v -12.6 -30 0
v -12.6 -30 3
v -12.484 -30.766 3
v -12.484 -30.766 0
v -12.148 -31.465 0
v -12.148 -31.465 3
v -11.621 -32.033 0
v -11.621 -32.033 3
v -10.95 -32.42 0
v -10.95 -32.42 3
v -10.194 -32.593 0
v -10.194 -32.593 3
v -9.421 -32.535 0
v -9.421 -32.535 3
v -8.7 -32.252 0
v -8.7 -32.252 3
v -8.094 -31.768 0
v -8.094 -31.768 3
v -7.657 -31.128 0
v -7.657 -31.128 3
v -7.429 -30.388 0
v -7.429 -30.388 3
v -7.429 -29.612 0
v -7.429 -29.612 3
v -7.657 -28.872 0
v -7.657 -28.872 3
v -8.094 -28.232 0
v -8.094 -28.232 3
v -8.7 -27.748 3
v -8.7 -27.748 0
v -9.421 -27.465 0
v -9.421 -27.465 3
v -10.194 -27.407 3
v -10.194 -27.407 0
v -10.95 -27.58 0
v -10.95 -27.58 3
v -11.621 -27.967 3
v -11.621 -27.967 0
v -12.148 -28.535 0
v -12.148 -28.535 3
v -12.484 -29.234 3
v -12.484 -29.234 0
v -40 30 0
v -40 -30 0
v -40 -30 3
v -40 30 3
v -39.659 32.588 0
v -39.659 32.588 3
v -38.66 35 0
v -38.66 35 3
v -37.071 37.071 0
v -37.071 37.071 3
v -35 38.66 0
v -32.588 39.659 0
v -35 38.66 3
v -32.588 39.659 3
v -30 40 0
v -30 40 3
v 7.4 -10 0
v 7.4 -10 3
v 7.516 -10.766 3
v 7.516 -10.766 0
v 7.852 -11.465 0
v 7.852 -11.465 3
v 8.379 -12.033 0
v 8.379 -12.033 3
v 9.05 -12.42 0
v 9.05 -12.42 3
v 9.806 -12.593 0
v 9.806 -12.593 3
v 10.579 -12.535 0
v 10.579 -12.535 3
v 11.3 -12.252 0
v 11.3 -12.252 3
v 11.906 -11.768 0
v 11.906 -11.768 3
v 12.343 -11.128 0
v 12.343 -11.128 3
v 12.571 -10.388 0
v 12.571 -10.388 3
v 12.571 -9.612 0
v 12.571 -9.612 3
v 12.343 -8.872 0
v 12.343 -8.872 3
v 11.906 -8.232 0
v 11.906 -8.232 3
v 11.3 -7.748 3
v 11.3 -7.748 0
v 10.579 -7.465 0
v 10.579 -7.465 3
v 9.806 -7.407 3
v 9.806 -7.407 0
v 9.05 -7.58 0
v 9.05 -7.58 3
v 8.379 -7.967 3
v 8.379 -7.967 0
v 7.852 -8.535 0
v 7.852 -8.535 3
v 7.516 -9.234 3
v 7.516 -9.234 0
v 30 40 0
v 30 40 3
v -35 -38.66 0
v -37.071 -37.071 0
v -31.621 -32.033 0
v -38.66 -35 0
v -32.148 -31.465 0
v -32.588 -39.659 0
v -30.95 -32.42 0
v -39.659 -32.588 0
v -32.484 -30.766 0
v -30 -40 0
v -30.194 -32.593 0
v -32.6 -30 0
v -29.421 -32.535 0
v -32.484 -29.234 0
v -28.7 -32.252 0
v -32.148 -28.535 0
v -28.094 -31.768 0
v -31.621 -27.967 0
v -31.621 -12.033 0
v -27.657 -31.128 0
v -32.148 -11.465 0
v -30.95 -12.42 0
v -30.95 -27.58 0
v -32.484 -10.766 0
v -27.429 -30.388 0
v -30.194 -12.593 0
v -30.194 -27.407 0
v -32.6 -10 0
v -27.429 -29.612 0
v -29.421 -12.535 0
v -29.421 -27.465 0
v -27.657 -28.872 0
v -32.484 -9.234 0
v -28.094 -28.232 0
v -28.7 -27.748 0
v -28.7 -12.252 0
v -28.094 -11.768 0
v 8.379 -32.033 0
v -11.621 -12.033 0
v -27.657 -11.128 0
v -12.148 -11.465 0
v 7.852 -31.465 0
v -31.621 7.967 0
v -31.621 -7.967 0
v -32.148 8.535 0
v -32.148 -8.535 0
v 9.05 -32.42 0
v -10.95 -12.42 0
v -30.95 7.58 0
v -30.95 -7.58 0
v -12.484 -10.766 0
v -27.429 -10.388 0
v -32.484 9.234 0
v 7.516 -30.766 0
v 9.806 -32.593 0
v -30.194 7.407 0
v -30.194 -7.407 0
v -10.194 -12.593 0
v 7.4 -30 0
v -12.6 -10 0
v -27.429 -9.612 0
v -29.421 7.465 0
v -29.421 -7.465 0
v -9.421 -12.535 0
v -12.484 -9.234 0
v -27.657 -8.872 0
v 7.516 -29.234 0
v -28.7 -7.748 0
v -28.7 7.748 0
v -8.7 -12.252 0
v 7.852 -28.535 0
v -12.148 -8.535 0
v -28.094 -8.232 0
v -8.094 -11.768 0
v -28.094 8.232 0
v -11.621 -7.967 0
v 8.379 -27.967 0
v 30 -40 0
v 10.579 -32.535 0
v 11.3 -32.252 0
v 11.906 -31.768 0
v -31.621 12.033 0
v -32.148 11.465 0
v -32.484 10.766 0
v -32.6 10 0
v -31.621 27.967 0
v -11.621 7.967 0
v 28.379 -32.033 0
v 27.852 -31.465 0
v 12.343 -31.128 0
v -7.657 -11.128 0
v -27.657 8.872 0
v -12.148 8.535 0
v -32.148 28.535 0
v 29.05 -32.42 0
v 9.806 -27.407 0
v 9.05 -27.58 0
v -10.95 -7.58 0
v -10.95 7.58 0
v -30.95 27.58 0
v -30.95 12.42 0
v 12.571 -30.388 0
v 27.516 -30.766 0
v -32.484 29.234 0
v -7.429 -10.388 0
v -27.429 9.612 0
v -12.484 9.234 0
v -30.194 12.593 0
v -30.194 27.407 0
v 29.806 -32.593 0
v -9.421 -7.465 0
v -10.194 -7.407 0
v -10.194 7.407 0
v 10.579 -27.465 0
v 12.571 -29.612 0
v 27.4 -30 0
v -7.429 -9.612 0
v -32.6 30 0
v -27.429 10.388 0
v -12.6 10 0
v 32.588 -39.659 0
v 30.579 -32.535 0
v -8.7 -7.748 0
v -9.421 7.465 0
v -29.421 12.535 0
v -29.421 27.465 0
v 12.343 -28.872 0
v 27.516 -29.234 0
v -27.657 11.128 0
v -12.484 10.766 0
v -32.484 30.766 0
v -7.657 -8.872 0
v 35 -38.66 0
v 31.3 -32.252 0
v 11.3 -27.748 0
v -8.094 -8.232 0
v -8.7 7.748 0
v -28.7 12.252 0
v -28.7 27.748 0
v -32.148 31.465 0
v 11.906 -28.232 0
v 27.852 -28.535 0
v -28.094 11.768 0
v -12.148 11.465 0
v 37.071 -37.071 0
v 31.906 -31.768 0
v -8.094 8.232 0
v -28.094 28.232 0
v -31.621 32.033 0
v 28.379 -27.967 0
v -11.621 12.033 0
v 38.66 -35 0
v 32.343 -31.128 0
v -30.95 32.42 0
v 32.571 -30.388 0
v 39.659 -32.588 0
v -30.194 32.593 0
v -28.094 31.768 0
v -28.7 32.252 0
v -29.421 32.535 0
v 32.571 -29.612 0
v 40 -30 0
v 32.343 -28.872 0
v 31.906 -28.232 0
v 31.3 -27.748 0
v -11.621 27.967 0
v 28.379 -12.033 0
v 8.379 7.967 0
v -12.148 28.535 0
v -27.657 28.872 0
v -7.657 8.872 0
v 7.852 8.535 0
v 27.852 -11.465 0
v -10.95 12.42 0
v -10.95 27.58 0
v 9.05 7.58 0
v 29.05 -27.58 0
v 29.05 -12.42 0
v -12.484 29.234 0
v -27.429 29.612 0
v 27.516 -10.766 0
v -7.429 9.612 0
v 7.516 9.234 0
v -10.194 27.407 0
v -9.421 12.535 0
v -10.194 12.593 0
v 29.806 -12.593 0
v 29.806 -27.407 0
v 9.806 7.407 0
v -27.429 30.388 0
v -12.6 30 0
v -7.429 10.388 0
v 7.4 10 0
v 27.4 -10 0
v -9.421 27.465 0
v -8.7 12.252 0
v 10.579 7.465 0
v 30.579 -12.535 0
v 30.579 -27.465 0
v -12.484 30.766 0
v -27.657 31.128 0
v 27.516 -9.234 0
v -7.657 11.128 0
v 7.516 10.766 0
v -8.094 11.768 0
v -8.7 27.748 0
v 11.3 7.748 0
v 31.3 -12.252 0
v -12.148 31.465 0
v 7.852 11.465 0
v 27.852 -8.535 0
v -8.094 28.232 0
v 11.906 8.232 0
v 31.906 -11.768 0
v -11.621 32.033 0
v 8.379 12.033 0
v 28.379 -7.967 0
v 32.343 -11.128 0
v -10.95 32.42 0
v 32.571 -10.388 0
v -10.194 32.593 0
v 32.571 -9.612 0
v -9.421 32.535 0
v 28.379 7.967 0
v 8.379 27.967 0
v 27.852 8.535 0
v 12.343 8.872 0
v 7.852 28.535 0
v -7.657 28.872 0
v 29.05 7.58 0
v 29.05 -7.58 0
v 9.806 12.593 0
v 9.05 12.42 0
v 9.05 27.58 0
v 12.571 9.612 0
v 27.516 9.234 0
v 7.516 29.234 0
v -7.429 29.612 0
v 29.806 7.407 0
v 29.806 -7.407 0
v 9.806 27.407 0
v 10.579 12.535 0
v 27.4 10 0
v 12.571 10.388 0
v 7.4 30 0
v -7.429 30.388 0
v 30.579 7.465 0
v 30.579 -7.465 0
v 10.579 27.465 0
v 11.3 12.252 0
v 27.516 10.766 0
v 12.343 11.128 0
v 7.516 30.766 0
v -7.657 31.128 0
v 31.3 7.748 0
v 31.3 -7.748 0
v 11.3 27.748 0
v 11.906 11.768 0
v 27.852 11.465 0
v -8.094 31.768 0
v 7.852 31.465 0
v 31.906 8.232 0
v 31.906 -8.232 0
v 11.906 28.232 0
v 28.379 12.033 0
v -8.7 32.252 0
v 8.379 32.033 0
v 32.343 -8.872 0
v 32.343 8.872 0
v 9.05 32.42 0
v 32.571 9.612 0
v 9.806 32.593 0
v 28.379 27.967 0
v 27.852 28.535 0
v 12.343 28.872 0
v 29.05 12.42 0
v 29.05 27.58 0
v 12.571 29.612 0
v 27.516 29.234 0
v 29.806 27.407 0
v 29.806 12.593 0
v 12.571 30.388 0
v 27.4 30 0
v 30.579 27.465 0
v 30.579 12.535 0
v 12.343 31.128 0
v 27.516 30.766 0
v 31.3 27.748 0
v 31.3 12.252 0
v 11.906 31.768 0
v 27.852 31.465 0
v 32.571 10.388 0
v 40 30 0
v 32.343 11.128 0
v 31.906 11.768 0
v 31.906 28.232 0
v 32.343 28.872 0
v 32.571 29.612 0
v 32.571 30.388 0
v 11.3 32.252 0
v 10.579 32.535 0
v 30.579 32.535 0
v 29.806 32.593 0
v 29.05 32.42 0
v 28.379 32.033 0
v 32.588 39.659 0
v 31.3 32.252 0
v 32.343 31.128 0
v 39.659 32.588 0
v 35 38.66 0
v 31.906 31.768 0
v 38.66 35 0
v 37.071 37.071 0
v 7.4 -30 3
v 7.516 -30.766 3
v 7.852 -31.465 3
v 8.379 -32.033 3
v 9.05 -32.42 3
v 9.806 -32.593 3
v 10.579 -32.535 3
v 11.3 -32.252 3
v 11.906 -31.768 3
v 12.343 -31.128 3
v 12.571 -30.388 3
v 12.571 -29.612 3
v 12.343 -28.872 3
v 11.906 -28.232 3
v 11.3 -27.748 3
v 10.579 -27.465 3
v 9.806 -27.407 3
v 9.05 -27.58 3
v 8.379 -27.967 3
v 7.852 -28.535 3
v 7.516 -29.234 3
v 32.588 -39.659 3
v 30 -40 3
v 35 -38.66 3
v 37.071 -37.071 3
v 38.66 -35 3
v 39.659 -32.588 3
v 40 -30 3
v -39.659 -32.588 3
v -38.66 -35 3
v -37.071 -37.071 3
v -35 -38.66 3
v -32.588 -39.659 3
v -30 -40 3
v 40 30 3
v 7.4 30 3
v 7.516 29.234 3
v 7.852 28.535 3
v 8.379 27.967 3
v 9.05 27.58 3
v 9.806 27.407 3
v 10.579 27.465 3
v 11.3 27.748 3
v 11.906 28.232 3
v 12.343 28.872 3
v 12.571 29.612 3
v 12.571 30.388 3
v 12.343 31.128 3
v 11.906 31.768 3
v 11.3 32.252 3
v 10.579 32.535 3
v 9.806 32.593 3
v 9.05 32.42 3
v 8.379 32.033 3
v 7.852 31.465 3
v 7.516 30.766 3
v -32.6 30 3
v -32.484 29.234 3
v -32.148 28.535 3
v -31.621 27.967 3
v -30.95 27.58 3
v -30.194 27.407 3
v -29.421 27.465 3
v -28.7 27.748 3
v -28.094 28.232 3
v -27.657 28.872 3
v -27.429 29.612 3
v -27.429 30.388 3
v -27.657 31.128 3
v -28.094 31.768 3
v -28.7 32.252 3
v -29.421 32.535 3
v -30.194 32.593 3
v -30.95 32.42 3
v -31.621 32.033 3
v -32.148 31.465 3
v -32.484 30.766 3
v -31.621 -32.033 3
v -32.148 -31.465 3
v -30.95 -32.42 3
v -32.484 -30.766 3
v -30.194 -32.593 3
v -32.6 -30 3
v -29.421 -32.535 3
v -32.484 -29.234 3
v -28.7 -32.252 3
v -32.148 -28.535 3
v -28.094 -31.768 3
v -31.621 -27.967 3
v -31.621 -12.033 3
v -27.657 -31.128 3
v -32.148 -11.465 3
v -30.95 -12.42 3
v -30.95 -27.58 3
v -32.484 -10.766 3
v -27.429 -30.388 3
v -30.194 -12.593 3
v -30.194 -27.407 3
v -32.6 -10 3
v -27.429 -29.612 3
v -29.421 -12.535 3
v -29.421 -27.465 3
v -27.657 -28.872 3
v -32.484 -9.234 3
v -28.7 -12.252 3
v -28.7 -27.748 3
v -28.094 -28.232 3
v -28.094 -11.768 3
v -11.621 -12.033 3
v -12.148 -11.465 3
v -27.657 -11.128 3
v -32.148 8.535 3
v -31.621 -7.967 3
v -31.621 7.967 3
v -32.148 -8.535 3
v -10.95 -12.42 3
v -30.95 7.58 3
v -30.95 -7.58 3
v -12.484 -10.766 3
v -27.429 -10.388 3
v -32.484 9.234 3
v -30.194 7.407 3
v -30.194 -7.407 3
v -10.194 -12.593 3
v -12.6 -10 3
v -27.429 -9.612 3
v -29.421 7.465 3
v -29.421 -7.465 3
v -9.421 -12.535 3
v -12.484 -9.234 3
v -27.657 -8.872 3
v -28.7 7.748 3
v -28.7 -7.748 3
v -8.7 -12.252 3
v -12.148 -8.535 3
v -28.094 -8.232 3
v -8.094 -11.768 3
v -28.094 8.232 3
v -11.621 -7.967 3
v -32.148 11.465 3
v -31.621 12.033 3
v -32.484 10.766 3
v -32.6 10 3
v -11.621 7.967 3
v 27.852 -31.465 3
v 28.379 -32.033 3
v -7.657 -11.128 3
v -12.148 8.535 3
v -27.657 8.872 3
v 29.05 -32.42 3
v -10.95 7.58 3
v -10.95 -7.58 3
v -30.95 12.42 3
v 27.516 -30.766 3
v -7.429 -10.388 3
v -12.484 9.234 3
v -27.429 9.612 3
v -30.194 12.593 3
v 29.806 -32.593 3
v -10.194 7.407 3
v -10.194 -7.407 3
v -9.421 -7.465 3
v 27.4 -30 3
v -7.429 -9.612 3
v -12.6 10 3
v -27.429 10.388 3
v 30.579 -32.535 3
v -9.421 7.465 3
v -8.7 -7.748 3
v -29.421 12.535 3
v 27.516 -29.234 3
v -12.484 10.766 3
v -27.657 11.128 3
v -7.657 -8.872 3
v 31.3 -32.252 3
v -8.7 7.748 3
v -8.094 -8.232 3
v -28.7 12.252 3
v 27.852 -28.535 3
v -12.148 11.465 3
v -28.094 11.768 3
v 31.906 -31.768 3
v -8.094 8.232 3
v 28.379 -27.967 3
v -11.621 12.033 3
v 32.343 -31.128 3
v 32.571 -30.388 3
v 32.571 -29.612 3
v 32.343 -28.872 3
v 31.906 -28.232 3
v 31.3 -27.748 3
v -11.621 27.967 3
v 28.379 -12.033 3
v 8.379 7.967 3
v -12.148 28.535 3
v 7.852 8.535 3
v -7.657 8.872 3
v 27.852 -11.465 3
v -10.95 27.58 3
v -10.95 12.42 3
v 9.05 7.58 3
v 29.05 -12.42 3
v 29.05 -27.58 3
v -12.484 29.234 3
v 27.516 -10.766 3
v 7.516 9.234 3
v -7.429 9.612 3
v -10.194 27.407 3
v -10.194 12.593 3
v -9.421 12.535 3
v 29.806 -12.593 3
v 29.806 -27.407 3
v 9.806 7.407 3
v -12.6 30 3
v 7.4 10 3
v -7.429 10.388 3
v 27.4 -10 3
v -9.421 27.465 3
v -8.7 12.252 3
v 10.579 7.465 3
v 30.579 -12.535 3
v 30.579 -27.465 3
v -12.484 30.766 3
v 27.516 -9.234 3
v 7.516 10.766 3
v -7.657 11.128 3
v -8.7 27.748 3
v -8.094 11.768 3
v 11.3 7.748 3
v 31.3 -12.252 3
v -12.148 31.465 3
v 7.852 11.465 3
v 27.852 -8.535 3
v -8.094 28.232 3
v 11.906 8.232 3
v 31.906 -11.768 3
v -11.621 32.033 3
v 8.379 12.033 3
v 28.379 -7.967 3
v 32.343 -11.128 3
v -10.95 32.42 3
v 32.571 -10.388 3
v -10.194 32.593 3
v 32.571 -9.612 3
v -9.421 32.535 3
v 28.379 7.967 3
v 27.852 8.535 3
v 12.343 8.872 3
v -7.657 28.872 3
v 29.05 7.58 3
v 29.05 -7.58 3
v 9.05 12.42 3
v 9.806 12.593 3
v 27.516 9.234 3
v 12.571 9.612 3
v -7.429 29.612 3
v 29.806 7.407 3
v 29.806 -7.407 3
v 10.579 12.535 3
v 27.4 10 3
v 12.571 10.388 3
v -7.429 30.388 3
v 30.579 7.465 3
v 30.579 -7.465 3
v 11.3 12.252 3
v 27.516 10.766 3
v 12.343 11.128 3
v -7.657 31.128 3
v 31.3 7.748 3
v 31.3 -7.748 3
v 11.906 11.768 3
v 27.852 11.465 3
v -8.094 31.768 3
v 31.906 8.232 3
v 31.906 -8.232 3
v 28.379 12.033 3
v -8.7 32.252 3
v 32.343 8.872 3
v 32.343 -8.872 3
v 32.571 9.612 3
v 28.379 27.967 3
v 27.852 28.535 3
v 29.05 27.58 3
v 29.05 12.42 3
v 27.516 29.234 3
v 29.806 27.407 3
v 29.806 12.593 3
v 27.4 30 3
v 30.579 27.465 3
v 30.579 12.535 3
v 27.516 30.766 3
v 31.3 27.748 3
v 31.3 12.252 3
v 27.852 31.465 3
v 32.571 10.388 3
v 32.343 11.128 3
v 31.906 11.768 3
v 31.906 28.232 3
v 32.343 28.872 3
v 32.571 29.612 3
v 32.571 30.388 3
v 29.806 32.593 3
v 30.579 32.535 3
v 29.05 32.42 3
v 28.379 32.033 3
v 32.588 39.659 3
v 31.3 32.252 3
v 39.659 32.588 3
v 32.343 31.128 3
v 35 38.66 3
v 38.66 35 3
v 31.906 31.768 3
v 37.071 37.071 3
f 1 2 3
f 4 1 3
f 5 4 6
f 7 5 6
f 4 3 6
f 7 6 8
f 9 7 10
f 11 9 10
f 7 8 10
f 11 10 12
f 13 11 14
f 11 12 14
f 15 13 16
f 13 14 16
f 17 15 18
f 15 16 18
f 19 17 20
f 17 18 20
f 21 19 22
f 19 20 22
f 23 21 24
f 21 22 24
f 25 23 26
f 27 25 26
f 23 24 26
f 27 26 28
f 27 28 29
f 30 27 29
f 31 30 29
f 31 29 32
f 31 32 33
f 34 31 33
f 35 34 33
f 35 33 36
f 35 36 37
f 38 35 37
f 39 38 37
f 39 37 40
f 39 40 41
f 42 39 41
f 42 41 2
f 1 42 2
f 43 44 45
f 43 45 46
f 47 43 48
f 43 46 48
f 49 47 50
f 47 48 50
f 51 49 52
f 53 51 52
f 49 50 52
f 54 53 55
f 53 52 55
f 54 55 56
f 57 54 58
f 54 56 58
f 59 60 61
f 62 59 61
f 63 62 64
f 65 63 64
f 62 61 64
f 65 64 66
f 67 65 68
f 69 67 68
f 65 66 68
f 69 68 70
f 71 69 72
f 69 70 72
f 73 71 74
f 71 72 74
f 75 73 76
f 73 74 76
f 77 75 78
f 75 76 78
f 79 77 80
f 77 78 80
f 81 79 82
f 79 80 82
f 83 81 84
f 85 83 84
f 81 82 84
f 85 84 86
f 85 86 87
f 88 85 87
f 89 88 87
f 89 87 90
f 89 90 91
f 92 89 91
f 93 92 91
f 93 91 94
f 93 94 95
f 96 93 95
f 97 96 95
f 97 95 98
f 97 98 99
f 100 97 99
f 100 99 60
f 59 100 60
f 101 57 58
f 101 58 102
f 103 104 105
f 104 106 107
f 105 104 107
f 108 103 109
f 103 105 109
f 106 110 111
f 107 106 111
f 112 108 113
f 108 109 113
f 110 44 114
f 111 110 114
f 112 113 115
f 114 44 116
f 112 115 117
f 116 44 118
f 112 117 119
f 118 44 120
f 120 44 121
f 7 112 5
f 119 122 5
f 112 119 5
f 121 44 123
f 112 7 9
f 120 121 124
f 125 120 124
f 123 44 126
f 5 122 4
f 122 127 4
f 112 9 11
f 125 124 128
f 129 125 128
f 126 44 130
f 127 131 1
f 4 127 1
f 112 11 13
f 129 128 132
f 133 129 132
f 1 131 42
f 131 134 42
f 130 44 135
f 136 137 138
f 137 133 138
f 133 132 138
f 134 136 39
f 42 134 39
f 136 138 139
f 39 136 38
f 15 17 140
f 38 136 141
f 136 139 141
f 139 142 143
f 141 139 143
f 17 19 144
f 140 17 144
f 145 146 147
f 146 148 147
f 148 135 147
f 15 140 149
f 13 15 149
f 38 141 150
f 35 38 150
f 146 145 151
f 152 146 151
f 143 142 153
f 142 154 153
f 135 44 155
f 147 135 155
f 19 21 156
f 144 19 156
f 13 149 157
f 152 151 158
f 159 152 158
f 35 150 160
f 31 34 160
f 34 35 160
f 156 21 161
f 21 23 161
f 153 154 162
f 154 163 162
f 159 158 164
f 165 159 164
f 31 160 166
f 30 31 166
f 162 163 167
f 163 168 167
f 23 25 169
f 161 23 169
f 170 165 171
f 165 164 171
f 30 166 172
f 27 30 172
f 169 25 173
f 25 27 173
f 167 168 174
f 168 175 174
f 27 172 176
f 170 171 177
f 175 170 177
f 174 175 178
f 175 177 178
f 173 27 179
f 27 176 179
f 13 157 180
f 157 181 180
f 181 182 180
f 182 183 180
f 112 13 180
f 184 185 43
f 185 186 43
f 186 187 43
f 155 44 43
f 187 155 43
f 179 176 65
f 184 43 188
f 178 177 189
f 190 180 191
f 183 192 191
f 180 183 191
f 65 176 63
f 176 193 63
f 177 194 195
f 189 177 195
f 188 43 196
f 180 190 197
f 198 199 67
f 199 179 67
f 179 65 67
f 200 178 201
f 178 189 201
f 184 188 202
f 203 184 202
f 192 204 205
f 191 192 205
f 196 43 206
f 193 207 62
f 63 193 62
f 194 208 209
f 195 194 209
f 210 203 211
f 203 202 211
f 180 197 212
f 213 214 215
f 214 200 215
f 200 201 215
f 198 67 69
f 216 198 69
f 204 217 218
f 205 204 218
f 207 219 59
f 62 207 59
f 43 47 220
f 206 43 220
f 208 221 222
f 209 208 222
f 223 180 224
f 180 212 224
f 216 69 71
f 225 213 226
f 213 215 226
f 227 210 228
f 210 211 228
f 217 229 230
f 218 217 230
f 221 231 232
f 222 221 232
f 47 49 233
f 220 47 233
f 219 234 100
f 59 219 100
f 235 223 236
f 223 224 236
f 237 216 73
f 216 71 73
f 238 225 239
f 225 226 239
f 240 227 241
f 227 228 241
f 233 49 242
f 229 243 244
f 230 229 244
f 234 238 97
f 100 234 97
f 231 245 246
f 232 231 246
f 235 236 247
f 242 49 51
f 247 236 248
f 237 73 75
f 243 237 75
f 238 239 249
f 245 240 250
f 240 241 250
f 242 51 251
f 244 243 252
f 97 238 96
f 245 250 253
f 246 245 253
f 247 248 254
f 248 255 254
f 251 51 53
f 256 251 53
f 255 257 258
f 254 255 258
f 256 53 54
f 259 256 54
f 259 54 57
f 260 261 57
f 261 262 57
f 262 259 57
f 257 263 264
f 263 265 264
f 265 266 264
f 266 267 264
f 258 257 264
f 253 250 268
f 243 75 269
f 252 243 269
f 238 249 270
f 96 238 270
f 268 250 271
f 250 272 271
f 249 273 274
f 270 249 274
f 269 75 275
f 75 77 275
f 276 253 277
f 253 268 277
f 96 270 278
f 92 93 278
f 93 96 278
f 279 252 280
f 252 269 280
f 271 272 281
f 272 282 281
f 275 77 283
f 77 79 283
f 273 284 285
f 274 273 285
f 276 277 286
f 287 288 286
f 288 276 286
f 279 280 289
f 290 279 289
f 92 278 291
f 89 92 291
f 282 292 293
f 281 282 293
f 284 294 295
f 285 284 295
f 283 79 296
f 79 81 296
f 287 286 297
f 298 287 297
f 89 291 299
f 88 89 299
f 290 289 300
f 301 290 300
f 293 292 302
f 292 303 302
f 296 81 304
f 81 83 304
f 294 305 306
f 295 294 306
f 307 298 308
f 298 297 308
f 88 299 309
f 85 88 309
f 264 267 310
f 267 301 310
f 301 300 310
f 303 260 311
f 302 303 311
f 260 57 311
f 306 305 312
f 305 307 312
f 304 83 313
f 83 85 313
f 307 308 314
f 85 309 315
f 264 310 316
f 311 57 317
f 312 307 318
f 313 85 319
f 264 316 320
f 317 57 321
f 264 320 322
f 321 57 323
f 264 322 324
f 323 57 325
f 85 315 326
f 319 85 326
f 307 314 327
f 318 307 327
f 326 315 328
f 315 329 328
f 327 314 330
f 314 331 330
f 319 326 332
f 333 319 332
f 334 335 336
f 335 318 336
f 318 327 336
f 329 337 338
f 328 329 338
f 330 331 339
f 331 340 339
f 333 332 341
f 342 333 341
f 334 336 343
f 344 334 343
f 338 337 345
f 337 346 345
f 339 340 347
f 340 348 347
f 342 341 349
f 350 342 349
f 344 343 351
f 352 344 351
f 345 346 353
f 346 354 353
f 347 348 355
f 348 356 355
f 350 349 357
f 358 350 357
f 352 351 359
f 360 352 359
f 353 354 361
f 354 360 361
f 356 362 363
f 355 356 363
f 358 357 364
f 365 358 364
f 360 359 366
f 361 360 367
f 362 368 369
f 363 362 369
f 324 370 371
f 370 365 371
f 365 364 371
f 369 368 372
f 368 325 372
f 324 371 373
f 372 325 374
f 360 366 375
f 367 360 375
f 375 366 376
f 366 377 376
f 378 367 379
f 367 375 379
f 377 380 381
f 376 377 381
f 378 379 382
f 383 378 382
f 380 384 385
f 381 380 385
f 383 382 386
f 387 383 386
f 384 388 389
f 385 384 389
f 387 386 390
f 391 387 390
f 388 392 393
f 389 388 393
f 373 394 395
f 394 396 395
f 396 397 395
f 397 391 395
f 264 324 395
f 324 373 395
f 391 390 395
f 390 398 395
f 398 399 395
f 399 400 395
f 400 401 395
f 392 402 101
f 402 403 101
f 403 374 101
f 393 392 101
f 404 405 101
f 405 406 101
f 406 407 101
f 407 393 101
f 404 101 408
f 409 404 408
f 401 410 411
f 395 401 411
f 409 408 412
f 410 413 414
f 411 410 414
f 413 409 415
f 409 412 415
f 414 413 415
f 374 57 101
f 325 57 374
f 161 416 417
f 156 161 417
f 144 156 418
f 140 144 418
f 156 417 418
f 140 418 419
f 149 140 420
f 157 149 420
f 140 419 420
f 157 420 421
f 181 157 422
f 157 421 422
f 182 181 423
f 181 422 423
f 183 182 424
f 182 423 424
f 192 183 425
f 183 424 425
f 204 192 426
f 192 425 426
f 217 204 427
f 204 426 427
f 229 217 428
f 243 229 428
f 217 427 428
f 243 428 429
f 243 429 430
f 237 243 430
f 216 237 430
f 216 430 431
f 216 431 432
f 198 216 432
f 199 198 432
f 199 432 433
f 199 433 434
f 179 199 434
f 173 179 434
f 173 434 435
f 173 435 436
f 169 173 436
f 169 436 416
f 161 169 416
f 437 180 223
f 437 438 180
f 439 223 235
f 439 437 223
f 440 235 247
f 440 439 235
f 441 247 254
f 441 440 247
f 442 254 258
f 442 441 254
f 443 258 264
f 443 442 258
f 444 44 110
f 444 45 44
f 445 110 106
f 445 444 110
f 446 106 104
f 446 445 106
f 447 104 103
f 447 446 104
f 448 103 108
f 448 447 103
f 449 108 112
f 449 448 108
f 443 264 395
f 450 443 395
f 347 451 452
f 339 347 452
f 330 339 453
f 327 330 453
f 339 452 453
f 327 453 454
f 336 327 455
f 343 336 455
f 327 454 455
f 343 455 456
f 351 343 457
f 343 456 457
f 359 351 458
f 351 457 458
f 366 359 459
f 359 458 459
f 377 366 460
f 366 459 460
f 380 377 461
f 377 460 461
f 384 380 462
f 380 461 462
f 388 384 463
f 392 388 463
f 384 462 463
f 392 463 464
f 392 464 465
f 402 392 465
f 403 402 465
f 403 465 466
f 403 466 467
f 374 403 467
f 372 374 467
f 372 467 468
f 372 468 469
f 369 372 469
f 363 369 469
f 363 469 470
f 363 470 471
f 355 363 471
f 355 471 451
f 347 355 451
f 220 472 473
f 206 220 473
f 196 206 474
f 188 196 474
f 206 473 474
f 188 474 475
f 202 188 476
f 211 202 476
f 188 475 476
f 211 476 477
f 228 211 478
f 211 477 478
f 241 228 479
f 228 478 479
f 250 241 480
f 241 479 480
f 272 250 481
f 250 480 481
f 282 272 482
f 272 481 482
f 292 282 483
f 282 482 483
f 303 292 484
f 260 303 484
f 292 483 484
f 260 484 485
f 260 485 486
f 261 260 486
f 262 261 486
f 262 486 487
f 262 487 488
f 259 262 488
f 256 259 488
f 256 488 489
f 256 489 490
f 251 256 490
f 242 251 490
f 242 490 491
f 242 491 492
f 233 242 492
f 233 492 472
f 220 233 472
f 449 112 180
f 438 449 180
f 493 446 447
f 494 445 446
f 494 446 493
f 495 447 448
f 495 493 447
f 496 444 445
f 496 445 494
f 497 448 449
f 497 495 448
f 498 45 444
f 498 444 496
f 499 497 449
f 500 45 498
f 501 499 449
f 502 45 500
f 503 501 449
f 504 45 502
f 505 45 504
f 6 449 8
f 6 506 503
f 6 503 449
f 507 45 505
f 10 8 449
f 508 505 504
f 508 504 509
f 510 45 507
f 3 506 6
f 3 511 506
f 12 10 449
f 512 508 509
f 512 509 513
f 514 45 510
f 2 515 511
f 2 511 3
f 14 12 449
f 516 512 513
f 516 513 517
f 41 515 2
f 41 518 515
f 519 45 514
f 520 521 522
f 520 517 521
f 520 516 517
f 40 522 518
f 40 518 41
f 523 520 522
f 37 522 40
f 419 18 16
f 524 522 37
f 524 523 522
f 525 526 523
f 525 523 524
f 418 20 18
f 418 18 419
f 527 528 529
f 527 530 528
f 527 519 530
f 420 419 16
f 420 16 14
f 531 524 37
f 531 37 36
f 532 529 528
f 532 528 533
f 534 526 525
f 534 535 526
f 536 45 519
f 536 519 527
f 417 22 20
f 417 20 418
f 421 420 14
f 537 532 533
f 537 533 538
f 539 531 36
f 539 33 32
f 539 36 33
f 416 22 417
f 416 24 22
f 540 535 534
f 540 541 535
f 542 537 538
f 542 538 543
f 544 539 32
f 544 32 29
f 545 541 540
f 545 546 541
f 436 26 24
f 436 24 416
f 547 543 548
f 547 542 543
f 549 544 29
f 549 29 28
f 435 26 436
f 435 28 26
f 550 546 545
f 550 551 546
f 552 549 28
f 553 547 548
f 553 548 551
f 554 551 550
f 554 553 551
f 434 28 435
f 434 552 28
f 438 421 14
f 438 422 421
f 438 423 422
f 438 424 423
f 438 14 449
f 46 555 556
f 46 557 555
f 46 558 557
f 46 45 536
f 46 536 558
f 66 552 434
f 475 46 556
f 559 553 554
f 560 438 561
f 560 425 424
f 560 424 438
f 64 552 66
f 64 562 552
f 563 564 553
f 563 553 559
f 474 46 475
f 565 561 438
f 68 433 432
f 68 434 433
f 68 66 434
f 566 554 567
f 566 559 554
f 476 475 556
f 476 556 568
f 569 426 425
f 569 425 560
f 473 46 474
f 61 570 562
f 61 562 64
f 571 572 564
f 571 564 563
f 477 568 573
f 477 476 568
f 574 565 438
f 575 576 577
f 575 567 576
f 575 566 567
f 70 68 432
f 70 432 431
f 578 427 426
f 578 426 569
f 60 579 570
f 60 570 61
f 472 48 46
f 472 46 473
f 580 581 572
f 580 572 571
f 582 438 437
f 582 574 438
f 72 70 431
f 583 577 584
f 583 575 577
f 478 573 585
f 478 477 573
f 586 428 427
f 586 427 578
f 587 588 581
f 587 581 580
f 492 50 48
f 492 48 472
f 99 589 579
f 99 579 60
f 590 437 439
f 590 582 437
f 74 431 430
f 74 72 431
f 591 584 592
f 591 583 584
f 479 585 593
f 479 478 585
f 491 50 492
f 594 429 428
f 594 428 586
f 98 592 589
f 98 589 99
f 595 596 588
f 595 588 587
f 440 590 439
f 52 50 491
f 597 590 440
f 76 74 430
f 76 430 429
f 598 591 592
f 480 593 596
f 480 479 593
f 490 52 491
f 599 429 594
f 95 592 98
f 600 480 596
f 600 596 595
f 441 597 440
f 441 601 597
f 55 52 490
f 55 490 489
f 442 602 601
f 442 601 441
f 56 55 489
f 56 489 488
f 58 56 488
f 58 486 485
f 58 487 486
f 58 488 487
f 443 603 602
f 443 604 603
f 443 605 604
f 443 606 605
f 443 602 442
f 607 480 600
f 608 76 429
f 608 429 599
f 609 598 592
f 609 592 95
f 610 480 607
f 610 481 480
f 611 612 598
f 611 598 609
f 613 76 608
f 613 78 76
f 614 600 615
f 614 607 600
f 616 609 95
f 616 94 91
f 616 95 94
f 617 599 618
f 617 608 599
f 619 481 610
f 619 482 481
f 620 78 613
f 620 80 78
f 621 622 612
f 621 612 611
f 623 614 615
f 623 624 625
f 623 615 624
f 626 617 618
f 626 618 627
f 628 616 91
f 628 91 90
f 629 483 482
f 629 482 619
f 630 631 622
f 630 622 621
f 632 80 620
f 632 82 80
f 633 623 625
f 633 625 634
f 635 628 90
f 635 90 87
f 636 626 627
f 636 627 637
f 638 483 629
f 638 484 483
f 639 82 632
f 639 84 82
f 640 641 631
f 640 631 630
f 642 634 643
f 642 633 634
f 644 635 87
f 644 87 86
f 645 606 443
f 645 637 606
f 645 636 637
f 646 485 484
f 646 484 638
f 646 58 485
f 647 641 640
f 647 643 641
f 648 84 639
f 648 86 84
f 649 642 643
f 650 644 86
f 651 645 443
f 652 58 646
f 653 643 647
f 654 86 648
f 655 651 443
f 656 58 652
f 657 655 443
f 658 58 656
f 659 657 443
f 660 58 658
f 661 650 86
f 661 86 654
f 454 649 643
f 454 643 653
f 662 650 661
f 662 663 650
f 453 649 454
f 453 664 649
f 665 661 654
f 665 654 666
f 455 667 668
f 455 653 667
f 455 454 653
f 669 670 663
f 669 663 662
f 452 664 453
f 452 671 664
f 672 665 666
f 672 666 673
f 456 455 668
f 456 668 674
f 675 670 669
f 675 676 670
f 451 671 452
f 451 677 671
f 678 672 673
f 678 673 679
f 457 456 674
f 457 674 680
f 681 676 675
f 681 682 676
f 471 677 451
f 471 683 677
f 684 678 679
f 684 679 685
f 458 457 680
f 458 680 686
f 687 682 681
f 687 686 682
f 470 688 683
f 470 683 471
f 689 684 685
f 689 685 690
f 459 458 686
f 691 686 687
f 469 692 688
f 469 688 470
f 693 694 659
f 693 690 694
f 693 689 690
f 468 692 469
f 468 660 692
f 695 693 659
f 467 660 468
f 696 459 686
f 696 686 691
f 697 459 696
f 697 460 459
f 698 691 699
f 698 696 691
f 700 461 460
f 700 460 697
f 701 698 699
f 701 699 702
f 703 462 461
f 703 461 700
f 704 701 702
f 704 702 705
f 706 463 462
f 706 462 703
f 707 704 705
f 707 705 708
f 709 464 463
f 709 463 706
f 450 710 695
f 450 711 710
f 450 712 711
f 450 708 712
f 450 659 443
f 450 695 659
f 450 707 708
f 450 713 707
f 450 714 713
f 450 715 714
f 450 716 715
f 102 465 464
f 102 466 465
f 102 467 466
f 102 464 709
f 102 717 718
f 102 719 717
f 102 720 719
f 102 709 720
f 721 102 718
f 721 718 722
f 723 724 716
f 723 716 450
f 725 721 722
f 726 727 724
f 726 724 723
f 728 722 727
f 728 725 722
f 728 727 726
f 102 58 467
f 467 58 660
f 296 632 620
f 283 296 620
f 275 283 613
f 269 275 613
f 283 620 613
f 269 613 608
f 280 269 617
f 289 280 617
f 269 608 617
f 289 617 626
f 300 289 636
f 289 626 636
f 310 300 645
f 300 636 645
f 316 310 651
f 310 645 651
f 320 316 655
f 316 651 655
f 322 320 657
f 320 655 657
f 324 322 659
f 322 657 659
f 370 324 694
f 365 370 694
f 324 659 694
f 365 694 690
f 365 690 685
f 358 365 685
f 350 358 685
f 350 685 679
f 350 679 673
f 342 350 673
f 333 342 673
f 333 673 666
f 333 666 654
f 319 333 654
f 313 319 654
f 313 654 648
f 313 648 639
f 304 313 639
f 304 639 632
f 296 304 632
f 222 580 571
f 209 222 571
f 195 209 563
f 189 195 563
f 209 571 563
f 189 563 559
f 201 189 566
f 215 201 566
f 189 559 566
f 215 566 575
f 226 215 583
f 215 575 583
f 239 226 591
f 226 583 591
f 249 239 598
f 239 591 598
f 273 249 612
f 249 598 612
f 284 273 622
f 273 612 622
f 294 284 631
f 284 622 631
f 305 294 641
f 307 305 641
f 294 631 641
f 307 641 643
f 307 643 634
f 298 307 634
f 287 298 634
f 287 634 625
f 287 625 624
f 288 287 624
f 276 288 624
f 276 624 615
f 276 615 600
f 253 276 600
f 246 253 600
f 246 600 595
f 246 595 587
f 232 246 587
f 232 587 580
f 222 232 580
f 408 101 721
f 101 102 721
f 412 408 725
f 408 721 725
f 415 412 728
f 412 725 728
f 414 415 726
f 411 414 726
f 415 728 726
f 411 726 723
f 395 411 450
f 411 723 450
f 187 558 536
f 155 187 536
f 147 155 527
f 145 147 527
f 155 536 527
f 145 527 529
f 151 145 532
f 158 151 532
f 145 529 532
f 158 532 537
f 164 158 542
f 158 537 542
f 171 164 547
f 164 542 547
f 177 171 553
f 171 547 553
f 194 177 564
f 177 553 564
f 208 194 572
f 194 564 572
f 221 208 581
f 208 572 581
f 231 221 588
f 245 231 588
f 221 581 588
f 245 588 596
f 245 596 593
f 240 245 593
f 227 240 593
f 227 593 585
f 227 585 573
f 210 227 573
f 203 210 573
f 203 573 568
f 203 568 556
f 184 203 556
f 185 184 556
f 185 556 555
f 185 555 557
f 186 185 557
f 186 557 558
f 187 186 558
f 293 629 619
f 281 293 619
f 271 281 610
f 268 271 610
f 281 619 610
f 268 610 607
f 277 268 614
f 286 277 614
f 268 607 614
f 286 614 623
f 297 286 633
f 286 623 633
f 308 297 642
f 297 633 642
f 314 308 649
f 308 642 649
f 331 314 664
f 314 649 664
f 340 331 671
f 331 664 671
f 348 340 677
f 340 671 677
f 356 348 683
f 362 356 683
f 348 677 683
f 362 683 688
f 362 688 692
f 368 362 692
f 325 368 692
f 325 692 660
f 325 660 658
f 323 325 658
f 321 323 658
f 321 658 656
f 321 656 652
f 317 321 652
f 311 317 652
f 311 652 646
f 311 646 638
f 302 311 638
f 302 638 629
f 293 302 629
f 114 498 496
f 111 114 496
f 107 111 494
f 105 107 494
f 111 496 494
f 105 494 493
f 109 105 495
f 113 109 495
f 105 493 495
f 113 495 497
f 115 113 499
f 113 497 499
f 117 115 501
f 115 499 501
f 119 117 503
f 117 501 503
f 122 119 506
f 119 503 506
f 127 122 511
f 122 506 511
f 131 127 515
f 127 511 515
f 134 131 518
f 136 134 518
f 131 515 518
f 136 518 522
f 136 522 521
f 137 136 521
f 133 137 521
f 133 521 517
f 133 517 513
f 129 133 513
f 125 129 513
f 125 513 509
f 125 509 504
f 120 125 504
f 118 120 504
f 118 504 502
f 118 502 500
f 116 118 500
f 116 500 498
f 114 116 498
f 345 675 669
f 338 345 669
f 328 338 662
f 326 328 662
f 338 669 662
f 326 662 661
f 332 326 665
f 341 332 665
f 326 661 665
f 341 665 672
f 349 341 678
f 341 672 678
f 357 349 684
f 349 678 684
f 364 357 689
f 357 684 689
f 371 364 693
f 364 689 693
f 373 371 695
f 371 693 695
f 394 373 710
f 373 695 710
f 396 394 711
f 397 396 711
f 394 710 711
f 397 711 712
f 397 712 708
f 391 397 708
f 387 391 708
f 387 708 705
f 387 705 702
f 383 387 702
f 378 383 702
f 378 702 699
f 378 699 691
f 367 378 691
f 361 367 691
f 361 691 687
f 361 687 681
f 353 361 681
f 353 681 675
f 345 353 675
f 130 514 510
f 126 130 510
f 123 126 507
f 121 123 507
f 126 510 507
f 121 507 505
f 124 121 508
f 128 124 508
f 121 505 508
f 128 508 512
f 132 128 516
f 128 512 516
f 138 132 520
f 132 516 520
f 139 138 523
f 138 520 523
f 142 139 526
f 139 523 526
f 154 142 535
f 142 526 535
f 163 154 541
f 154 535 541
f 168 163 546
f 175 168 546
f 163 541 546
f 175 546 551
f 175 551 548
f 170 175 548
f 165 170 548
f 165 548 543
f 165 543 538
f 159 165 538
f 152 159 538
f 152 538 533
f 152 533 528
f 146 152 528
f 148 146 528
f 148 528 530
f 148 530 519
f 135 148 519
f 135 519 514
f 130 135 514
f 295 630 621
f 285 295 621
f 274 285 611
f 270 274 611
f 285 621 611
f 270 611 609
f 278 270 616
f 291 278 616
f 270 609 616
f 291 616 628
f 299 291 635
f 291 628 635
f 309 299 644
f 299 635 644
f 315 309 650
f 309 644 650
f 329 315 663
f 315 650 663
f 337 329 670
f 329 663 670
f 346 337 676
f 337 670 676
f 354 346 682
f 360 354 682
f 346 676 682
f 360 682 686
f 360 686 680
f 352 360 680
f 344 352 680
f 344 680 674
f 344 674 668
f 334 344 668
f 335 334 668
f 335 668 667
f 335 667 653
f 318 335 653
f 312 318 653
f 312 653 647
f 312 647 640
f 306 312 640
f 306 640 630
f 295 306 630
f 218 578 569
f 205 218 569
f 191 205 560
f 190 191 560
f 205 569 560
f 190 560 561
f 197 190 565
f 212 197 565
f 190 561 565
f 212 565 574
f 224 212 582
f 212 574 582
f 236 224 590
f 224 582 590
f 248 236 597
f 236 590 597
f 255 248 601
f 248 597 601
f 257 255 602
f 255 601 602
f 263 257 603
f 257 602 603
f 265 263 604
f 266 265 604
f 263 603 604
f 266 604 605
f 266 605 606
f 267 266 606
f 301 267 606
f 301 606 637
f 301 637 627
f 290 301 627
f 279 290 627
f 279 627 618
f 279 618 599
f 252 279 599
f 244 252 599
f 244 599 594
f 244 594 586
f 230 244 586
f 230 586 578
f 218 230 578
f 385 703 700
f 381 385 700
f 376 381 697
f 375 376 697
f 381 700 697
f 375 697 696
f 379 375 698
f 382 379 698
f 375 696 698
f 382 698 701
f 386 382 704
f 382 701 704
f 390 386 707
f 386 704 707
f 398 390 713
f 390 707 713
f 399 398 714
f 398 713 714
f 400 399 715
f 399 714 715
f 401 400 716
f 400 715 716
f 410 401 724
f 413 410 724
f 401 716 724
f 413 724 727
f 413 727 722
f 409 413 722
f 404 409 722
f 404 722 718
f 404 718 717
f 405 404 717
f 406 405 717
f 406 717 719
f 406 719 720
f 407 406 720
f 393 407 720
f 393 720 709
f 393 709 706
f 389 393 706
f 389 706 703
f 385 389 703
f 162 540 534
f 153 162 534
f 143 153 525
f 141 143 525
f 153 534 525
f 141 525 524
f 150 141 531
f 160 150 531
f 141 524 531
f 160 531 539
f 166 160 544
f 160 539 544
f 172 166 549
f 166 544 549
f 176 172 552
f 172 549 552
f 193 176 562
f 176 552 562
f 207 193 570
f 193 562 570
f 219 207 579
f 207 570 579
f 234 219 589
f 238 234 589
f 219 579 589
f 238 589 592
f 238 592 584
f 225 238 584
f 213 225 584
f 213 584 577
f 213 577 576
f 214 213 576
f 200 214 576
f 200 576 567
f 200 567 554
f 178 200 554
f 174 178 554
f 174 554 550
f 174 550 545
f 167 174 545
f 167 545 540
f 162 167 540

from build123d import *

# Parameters (mm, degrees)
F0_W     = 80
F0_H     = 80
F1_DEPTH = 3
F2_D     = 5.2
F3_R     = 10


with BuildPart() as f1:
    # F0 (on Top) → F1 (new body)
    with BuildSketch(Plane.XY):
        Rectangle(F0_W, F0_H)
    extrude(amount=F1_DEPTH)

    # F2 (through all)
    with Locations(Plane(origin=(0, 0, 0), x_dir=(1, 0, 0), z_dir=(0, 0, -1))):
        with Locations((-30, 30), (-10, 30), (10, 30), (30, 30), (30, 10), (10, 10), (-10, 10), (-30, 10), (-30, -10), (-10, -10), (10, -10), (30, -10), (30, -30), (10, -30), (-10, -30), (-30, -30)):
            Hole(F2_D / 2)

    # F3
    f3_edges = [f1.edges().sort_by_distance(p)[0] for p in [
        (40, 40, 1.5),
        (-40, 40, 1.5),
        (-40, -40, 1.5),
        (40, -40, 1.5),
    ]]
    fillet(f3_edges, radius=F3_R)


solid = f1.part
